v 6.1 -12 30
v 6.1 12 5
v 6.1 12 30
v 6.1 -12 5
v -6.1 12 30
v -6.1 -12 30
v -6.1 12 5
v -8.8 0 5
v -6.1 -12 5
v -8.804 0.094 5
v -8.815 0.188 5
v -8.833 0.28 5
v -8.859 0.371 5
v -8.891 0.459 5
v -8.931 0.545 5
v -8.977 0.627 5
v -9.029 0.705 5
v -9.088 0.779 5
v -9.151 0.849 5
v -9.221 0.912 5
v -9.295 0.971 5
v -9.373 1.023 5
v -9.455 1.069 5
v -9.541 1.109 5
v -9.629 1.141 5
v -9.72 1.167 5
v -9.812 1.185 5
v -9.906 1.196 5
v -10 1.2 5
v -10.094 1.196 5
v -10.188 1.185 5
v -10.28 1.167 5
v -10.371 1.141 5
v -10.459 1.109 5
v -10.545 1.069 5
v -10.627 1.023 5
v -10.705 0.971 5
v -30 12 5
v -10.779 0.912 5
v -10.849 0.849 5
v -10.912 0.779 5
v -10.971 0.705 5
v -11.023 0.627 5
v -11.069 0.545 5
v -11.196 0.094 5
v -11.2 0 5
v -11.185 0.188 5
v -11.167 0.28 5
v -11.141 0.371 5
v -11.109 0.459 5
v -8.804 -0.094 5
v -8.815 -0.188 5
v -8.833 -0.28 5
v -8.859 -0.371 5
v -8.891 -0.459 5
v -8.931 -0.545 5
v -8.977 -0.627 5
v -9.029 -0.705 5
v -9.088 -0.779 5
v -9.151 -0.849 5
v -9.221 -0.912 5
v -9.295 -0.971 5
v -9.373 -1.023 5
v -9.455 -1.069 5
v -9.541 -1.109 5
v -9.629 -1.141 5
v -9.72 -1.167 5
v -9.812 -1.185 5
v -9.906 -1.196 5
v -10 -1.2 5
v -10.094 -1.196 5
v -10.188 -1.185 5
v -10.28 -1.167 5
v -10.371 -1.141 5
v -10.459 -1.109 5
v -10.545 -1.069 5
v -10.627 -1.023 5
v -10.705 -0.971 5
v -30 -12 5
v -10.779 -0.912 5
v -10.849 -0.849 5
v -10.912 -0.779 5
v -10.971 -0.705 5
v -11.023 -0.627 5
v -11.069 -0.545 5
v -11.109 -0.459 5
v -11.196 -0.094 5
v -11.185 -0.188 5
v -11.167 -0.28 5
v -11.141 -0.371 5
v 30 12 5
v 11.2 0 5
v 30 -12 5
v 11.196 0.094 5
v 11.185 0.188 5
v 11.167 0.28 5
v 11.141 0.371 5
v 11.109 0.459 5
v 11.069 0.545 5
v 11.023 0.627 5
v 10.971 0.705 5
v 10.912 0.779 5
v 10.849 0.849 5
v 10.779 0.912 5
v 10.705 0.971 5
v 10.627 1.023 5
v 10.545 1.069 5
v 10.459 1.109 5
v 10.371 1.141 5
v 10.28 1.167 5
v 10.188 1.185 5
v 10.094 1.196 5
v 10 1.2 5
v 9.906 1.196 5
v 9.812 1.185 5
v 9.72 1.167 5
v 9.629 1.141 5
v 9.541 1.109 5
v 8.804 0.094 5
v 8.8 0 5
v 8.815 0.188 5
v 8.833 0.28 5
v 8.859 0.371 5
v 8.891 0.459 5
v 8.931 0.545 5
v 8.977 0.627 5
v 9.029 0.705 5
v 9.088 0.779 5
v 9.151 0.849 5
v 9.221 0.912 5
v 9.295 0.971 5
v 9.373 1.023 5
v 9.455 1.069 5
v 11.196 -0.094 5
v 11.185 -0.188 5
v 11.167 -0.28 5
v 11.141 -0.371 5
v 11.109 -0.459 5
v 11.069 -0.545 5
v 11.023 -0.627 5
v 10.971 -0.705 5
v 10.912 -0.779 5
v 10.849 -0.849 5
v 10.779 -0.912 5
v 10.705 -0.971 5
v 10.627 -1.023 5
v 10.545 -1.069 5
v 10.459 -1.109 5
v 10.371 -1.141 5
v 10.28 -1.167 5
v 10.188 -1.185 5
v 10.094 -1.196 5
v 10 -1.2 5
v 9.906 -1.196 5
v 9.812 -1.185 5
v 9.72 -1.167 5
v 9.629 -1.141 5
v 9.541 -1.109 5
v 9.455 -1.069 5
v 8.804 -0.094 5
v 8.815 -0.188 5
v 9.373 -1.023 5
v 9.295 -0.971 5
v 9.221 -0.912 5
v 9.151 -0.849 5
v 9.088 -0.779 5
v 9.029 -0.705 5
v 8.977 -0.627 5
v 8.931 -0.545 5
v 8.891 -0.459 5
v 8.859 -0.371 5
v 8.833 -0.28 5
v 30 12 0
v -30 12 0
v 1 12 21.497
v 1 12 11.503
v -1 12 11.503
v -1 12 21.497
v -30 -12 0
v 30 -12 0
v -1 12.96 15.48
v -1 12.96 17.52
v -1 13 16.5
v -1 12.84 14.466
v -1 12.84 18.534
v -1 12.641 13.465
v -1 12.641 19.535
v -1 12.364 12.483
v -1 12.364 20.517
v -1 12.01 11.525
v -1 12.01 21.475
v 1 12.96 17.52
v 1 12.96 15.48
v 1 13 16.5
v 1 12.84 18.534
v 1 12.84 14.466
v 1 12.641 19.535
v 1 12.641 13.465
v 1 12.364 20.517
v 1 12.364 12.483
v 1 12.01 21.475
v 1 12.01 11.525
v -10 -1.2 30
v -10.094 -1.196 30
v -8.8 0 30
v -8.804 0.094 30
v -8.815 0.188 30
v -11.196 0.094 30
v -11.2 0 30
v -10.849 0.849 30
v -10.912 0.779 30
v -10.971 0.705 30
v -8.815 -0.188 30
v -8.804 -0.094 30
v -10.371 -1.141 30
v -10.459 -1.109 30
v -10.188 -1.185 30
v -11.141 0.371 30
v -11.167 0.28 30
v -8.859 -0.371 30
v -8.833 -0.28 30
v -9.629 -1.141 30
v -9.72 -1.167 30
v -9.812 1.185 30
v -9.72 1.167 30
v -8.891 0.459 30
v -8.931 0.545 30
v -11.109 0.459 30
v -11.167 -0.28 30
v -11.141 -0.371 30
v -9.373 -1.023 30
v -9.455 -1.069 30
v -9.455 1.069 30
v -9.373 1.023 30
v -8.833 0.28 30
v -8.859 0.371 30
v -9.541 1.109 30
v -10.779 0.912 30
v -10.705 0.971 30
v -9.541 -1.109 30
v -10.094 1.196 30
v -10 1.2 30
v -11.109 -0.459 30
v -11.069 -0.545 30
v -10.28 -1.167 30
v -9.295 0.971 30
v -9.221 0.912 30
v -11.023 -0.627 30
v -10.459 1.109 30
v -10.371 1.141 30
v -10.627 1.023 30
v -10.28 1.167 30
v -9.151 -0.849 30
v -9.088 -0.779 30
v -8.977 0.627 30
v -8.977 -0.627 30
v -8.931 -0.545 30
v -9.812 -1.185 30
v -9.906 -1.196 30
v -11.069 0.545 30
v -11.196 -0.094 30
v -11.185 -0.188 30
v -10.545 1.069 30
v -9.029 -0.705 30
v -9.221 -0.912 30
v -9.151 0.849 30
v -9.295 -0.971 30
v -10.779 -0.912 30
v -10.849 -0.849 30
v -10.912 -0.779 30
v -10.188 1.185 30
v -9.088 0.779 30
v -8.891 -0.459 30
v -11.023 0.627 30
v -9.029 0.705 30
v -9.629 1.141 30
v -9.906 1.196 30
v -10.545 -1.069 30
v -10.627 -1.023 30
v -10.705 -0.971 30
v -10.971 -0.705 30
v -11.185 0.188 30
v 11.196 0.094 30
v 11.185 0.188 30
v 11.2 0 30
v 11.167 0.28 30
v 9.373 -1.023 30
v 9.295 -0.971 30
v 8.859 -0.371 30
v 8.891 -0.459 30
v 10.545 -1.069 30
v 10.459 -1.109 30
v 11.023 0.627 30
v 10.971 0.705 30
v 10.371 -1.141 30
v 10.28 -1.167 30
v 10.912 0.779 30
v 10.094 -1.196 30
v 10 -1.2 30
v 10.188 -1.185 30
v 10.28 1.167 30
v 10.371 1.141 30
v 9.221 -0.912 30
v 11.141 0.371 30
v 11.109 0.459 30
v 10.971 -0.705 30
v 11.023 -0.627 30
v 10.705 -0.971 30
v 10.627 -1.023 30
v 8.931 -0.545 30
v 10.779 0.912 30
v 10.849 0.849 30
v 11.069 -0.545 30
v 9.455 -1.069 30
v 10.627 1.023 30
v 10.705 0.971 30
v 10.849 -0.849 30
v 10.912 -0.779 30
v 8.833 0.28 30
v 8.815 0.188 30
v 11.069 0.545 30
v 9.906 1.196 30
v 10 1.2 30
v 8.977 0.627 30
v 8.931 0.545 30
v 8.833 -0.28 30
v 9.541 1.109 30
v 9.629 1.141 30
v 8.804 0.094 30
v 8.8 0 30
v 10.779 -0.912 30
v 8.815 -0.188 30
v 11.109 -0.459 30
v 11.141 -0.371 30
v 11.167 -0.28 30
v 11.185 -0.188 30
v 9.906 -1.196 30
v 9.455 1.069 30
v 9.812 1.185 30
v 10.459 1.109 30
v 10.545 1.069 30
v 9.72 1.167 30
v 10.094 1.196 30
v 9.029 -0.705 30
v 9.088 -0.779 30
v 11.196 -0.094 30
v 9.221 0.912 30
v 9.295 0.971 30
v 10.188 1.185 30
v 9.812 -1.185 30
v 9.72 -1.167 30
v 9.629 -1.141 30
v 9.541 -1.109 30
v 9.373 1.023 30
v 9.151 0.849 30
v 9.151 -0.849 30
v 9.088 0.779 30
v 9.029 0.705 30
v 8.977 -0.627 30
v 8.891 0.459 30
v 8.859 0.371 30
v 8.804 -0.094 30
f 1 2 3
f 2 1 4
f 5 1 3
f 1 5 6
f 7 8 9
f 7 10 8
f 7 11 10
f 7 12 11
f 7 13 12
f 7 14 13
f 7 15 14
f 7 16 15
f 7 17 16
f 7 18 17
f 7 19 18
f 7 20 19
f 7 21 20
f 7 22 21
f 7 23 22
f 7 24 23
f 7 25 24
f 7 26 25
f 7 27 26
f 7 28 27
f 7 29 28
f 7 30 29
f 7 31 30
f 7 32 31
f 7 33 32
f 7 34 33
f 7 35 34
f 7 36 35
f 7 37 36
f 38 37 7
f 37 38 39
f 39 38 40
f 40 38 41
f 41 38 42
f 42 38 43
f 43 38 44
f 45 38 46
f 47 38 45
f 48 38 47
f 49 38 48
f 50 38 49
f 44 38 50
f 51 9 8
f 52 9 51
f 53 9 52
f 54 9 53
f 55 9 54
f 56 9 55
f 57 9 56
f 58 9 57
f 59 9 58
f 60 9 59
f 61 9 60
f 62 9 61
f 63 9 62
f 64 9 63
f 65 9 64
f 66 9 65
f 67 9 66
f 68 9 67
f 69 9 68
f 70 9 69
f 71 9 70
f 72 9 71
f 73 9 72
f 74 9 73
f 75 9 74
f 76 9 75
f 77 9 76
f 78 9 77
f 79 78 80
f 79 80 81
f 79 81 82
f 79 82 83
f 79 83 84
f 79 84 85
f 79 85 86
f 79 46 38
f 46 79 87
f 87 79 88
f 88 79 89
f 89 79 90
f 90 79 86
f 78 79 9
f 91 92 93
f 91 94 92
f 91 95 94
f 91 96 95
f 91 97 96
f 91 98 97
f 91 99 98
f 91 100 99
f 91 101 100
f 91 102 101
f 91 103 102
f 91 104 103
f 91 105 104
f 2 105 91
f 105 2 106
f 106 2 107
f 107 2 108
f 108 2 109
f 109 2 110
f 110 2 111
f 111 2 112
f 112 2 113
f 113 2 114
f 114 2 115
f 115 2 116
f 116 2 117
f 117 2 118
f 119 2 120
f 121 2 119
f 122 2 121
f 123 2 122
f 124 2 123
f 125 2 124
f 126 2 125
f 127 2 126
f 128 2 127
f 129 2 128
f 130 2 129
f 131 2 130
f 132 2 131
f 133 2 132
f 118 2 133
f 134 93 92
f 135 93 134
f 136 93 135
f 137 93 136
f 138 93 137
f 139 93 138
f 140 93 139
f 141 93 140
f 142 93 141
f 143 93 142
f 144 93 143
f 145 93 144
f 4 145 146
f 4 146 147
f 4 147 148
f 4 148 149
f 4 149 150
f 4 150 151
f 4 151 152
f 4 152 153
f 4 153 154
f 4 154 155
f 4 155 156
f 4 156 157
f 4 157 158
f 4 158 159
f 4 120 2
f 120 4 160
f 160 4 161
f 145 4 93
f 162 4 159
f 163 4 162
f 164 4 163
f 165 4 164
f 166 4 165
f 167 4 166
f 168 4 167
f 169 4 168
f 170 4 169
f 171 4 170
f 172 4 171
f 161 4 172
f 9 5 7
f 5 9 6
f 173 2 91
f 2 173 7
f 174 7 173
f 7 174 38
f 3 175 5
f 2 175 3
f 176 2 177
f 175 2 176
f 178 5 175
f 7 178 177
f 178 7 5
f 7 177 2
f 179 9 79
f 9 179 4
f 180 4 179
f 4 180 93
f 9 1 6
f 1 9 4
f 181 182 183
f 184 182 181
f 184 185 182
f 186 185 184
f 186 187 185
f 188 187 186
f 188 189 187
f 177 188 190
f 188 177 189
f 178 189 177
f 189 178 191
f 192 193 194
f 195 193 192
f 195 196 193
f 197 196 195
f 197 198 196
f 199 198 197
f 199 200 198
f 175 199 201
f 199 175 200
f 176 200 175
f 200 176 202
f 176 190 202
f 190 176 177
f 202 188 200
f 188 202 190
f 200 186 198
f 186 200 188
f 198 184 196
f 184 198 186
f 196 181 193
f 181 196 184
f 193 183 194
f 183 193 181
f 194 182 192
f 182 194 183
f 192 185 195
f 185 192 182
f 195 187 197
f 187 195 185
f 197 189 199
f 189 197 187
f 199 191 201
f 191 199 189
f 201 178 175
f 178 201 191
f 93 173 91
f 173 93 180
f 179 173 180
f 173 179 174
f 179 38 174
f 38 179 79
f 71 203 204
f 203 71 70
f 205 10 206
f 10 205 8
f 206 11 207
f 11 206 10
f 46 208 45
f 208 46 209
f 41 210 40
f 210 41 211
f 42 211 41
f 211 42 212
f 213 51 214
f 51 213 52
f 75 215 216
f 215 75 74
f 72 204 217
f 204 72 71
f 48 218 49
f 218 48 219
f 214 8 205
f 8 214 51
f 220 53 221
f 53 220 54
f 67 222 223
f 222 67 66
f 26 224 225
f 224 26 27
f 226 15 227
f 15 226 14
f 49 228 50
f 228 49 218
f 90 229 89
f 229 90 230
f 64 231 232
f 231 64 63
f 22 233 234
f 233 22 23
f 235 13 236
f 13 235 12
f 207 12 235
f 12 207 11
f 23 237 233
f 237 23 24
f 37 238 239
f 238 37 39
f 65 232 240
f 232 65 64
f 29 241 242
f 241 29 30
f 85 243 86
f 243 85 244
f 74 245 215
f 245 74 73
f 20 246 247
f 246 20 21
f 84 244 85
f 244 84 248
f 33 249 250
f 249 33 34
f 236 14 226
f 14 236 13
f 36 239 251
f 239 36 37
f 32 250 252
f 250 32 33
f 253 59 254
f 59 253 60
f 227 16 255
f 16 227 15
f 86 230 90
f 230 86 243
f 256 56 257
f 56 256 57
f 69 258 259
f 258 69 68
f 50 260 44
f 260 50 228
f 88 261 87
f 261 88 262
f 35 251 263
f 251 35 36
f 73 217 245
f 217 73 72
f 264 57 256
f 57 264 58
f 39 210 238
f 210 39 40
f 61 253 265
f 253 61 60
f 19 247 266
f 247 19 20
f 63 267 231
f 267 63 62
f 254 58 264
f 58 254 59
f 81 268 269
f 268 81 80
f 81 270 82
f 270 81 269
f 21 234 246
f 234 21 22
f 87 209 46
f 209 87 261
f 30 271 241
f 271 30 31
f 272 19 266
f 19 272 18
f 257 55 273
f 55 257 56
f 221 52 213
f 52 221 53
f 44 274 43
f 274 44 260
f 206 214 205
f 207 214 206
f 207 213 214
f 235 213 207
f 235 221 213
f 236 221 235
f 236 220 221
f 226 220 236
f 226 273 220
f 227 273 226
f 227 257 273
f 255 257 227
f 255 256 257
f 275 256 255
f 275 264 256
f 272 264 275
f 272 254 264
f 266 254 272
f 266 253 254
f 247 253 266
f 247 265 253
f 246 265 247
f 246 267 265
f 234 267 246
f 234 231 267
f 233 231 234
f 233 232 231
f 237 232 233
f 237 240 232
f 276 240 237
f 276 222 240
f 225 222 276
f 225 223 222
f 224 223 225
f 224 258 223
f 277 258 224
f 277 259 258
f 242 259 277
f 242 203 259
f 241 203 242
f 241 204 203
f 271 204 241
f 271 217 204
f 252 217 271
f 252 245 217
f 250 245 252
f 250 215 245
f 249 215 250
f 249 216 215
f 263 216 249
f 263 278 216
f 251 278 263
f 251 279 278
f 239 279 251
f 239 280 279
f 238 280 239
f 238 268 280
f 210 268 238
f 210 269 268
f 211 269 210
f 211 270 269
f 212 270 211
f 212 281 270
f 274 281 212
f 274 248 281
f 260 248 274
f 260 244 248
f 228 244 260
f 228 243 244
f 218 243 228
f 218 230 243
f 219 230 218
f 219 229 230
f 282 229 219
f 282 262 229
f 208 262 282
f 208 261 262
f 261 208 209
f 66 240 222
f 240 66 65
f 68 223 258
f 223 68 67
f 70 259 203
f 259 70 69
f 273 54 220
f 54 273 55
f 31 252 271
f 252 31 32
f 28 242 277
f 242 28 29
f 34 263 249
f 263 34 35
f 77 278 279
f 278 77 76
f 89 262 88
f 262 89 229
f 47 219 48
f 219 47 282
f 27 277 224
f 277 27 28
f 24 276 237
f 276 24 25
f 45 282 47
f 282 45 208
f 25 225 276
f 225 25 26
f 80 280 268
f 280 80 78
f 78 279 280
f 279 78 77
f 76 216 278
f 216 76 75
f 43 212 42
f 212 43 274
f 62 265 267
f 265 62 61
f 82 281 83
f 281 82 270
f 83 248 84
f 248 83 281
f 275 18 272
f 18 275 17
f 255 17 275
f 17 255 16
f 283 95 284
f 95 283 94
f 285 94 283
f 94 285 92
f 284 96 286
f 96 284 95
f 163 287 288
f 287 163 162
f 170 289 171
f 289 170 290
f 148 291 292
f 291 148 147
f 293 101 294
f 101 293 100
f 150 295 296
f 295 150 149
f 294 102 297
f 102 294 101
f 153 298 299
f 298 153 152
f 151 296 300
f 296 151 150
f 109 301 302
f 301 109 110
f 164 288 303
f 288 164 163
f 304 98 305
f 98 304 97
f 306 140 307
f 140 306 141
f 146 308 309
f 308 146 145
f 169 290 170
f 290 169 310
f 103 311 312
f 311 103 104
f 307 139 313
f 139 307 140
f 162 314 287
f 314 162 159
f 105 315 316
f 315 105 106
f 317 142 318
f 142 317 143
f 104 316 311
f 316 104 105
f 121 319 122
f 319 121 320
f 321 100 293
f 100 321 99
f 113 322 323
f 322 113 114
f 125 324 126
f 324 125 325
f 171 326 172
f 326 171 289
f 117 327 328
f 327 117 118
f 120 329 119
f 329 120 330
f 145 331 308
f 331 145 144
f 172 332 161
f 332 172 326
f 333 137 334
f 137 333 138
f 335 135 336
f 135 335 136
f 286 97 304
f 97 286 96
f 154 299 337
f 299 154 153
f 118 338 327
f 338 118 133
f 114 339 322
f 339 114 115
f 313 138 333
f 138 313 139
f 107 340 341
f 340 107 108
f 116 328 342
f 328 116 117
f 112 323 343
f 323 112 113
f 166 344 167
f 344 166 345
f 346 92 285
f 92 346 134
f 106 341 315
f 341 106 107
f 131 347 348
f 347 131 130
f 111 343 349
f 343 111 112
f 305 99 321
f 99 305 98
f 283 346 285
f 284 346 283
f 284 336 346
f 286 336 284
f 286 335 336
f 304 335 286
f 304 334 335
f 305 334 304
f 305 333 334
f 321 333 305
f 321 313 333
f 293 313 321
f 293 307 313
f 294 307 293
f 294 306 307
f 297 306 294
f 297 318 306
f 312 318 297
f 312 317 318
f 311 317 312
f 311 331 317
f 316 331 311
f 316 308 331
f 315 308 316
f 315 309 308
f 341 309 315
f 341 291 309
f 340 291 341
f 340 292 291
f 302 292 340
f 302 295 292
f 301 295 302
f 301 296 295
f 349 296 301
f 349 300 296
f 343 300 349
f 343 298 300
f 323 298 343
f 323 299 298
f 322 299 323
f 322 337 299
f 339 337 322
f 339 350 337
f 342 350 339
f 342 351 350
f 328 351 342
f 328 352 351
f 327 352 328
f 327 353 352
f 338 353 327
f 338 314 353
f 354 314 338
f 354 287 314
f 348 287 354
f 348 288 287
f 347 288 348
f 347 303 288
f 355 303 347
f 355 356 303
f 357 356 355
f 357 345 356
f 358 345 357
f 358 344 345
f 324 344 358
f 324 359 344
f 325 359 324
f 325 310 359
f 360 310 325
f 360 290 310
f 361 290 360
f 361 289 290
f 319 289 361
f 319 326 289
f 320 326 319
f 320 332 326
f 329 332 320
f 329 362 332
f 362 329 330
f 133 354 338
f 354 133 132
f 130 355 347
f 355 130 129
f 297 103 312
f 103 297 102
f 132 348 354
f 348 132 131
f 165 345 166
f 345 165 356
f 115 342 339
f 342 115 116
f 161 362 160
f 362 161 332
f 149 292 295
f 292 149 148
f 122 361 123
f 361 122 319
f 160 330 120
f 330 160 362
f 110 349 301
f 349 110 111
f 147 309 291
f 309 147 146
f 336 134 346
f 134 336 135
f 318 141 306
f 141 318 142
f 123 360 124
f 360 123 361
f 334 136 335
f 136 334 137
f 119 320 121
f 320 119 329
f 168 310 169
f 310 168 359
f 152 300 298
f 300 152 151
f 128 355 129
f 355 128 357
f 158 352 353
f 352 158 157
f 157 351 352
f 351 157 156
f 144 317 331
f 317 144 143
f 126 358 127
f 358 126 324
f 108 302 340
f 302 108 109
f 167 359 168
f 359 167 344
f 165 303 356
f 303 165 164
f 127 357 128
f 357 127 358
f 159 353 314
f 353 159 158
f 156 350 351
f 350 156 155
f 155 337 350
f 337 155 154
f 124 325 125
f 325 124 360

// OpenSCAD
//
// Dual-Probe Vertical Version with SG90 Servo Mount
// Horn swings left/right between probes to block or free them.
//
// Author: ChatGPT
//

// ===== PARAMETERS =====
probe_dia = 2.0;          // Probe diameter
probe_spacing = 20.0;     // Distance between probe centers
guide_height = 25.0;      // Vertical travel guide
base_thickness = 5.0;     // Base plate
spring_clearance = 5.0;   // Gap under guide for springs
servo_w = 12.2;           // SG90 width
servo_h = 23.0;           // SG90 height
servo_d = 24.0;           // SG90 depth
horn_radius = probe_spacing/2 + 3.0;  // Horn half-circle radius
horn_thickness = 2.0;     // Horn plate thickness
horn_height = 20.0;       // Height of the horn
shaft_dia = 4.8;          // Servo shaft clearance
$fn = 80;

// ===== MODULES =====

// Base platform
module base_plate(){
    translate([-30,-servo_d/2,0])
        cube([60, servo_d, base_thickness]);
}

// Vertical probe guide tubes
module probe_guide(xoff){
    translate([xoff,0,base_thickness])
        cylinder(h = guide_height, d = probe_dia + 0.4);
}

// Servo mount block for SG90
module servo_mount(){
    // Outer housing
    translate([-servo_w/2, -servo_d/2, base_thickness])
        cube([servo_w, servo_d, servo_h + 2]);
    // Servo cavity
    difference(){
        translate([-servo_w/2, -servo_d/2, base_thickness])
            cube([servo_w, servo_d, servo_h + 2]);
        translate([-servo_w/2+0.6, -servo_d/2+0.6, base_thickness+0.6])
            cube([servo_w-1.2, servo_d-1.2, servo_h + 1]);
    }
}

// Vertical horn (semi-circular gate)
module vertical_horn(){
    difference(){
        // Main half-disc
        rotate([0,90,0])
            translate([0,0,-horn_thickness/2])
                linear_extrude(height = horn_thickness)
                    difference(){
                        circle(horn_radius);
                        circle(horn_radius - 2.0);
                        // Cut back half to form semicircle
                        translate([-horn_radius,-horn_radius])
                            square([2*horn_radius, horn_radius]);
                    }

        // Shaft hole
        rotate([0,90,0])
            translate([0,0,-horn_thickness])
                cylinder(h=2*horn_thickness, d=shaft_dia);
    }
}

// ===== ASSEMBLY =====
union(){
    base_plate();

    // Servo mount
    servo_mount();

    // Probe guides (left/right)
    probe_guide(-probe_spacing/2);
    probe_guide(probe_spacing/2);

    // Horn positioned at servo shaft height
    translate([0,0,base_thickness + servo_h/2])
        vertical_horn();
}
